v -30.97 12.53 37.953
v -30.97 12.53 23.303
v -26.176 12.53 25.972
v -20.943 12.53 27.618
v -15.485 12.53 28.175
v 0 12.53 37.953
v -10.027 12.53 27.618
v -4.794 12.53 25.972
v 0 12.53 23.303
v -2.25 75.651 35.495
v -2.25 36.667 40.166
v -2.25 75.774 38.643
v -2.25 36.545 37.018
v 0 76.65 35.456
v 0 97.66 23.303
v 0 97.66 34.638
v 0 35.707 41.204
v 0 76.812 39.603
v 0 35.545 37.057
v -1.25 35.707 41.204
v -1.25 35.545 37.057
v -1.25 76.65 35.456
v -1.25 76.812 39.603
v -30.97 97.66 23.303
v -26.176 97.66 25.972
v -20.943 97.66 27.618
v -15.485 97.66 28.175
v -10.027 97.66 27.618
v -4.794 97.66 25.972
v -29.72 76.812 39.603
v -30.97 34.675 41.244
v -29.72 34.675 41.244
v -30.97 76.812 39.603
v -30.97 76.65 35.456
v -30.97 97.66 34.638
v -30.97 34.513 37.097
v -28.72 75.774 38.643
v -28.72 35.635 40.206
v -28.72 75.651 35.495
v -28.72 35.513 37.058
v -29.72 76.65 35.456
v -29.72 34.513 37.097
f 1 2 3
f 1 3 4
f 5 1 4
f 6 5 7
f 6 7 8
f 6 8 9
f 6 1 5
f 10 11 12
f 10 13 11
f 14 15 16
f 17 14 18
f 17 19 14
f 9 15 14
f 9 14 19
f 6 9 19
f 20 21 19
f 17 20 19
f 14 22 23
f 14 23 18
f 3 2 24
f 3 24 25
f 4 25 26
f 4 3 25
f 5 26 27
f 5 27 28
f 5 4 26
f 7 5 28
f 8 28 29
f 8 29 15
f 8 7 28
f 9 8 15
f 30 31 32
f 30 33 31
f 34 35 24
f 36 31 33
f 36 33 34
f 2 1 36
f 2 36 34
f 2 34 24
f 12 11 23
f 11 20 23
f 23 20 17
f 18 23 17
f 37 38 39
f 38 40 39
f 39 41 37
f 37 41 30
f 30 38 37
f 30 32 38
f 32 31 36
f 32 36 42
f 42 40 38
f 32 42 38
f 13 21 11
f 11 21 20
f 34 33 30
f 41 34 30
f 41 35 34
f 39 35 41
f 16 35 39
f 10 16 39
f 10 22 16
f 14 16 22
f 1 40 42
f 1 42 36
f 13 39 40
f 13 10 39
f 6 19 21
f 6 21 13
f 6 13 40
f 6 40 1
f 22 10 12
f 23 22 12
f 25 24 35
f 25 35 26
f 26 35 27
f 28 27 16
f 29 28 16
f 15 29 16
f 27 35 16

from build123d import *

# Parameters (mm, degrees)
F1_DEPTH = 30.97
F2_W     = 2.25
F2_H     = 41.1360506777
F2_H_2   = 42.1689638739
F3_DEPTH = 4.15
F4_SIZE  = 1
F5_SIZE  = 1
F7_DEPTH = 85.13


with BuildPart() as f1:
    # F0 (on Right) → F1 (new body)
    with BuildSketch(Plane.YZ):
        Polygon((97.6600019388, 28.3032343221), (97.6600019388, 34.6382343221), (12.5300019388, 37.9532343221), (12.5300019388, 28.3032343221), align=None)
    extrude(amount=-F1_DEPTH)

    # F2 (on face) → F3 (join)
    with BuildSketch(Plane(origin=(0, 1.4946493439, 38.3829558521), x_dir=(1, 0, 0), z_dir=(0, 0.0389109537, 0.9992426821))):
        with Locations((-1.125, 54.6446547341)):
            Rectangle(F2_W, F2_H)
        with Locations((-29.845, 54.128198136)):
            Rectangle(F2_W, F2_H_2)
    extrude(amount=F3_DEPTH)

    # F4
    f4_edges = [f1.edges().sort_by_distance(p)[0] for p in [
        (-28.72, 55.743336, 40.423633),
        (-2.25, 56.259401, 40.403537),
    ]]
    chamfer(f4_edges, length=F4_SIZE)

    # F5
    f5_edges = [f1.edges().sort_by_distance(p)[0] for p in [
        (-2.25, 76.711654, 37.030166),
        (-2.25, 35.606757, 38.630809),
        (-28.72, 34.574626, 38.671001),
        (-28.72, 76.711654, 37.030166),
    ]]
    chamfer(f5_edges, length=F5_SIZE)

    # F6 (on face) → F7 (join, through all)
    with BuildSketch(Plane.XZ.offset(-12.5300019388)):
        with BuildLine():
            Line((0, 28.3032343221), (-30.97, 28.3032343221))
            Line((-30.97, 28.3032343221), (-30.97, 23.3032343221))
            ThreePointArc((-30.97, 23.3032343221), (-15.485, 28.1745693779), (0, 23.3032343221))
            Line((0, 23.3032343221), (0, 28.3032343221))
        make_face()
    extrude(amount=-F7_DEPTH)


solid = f1.part
